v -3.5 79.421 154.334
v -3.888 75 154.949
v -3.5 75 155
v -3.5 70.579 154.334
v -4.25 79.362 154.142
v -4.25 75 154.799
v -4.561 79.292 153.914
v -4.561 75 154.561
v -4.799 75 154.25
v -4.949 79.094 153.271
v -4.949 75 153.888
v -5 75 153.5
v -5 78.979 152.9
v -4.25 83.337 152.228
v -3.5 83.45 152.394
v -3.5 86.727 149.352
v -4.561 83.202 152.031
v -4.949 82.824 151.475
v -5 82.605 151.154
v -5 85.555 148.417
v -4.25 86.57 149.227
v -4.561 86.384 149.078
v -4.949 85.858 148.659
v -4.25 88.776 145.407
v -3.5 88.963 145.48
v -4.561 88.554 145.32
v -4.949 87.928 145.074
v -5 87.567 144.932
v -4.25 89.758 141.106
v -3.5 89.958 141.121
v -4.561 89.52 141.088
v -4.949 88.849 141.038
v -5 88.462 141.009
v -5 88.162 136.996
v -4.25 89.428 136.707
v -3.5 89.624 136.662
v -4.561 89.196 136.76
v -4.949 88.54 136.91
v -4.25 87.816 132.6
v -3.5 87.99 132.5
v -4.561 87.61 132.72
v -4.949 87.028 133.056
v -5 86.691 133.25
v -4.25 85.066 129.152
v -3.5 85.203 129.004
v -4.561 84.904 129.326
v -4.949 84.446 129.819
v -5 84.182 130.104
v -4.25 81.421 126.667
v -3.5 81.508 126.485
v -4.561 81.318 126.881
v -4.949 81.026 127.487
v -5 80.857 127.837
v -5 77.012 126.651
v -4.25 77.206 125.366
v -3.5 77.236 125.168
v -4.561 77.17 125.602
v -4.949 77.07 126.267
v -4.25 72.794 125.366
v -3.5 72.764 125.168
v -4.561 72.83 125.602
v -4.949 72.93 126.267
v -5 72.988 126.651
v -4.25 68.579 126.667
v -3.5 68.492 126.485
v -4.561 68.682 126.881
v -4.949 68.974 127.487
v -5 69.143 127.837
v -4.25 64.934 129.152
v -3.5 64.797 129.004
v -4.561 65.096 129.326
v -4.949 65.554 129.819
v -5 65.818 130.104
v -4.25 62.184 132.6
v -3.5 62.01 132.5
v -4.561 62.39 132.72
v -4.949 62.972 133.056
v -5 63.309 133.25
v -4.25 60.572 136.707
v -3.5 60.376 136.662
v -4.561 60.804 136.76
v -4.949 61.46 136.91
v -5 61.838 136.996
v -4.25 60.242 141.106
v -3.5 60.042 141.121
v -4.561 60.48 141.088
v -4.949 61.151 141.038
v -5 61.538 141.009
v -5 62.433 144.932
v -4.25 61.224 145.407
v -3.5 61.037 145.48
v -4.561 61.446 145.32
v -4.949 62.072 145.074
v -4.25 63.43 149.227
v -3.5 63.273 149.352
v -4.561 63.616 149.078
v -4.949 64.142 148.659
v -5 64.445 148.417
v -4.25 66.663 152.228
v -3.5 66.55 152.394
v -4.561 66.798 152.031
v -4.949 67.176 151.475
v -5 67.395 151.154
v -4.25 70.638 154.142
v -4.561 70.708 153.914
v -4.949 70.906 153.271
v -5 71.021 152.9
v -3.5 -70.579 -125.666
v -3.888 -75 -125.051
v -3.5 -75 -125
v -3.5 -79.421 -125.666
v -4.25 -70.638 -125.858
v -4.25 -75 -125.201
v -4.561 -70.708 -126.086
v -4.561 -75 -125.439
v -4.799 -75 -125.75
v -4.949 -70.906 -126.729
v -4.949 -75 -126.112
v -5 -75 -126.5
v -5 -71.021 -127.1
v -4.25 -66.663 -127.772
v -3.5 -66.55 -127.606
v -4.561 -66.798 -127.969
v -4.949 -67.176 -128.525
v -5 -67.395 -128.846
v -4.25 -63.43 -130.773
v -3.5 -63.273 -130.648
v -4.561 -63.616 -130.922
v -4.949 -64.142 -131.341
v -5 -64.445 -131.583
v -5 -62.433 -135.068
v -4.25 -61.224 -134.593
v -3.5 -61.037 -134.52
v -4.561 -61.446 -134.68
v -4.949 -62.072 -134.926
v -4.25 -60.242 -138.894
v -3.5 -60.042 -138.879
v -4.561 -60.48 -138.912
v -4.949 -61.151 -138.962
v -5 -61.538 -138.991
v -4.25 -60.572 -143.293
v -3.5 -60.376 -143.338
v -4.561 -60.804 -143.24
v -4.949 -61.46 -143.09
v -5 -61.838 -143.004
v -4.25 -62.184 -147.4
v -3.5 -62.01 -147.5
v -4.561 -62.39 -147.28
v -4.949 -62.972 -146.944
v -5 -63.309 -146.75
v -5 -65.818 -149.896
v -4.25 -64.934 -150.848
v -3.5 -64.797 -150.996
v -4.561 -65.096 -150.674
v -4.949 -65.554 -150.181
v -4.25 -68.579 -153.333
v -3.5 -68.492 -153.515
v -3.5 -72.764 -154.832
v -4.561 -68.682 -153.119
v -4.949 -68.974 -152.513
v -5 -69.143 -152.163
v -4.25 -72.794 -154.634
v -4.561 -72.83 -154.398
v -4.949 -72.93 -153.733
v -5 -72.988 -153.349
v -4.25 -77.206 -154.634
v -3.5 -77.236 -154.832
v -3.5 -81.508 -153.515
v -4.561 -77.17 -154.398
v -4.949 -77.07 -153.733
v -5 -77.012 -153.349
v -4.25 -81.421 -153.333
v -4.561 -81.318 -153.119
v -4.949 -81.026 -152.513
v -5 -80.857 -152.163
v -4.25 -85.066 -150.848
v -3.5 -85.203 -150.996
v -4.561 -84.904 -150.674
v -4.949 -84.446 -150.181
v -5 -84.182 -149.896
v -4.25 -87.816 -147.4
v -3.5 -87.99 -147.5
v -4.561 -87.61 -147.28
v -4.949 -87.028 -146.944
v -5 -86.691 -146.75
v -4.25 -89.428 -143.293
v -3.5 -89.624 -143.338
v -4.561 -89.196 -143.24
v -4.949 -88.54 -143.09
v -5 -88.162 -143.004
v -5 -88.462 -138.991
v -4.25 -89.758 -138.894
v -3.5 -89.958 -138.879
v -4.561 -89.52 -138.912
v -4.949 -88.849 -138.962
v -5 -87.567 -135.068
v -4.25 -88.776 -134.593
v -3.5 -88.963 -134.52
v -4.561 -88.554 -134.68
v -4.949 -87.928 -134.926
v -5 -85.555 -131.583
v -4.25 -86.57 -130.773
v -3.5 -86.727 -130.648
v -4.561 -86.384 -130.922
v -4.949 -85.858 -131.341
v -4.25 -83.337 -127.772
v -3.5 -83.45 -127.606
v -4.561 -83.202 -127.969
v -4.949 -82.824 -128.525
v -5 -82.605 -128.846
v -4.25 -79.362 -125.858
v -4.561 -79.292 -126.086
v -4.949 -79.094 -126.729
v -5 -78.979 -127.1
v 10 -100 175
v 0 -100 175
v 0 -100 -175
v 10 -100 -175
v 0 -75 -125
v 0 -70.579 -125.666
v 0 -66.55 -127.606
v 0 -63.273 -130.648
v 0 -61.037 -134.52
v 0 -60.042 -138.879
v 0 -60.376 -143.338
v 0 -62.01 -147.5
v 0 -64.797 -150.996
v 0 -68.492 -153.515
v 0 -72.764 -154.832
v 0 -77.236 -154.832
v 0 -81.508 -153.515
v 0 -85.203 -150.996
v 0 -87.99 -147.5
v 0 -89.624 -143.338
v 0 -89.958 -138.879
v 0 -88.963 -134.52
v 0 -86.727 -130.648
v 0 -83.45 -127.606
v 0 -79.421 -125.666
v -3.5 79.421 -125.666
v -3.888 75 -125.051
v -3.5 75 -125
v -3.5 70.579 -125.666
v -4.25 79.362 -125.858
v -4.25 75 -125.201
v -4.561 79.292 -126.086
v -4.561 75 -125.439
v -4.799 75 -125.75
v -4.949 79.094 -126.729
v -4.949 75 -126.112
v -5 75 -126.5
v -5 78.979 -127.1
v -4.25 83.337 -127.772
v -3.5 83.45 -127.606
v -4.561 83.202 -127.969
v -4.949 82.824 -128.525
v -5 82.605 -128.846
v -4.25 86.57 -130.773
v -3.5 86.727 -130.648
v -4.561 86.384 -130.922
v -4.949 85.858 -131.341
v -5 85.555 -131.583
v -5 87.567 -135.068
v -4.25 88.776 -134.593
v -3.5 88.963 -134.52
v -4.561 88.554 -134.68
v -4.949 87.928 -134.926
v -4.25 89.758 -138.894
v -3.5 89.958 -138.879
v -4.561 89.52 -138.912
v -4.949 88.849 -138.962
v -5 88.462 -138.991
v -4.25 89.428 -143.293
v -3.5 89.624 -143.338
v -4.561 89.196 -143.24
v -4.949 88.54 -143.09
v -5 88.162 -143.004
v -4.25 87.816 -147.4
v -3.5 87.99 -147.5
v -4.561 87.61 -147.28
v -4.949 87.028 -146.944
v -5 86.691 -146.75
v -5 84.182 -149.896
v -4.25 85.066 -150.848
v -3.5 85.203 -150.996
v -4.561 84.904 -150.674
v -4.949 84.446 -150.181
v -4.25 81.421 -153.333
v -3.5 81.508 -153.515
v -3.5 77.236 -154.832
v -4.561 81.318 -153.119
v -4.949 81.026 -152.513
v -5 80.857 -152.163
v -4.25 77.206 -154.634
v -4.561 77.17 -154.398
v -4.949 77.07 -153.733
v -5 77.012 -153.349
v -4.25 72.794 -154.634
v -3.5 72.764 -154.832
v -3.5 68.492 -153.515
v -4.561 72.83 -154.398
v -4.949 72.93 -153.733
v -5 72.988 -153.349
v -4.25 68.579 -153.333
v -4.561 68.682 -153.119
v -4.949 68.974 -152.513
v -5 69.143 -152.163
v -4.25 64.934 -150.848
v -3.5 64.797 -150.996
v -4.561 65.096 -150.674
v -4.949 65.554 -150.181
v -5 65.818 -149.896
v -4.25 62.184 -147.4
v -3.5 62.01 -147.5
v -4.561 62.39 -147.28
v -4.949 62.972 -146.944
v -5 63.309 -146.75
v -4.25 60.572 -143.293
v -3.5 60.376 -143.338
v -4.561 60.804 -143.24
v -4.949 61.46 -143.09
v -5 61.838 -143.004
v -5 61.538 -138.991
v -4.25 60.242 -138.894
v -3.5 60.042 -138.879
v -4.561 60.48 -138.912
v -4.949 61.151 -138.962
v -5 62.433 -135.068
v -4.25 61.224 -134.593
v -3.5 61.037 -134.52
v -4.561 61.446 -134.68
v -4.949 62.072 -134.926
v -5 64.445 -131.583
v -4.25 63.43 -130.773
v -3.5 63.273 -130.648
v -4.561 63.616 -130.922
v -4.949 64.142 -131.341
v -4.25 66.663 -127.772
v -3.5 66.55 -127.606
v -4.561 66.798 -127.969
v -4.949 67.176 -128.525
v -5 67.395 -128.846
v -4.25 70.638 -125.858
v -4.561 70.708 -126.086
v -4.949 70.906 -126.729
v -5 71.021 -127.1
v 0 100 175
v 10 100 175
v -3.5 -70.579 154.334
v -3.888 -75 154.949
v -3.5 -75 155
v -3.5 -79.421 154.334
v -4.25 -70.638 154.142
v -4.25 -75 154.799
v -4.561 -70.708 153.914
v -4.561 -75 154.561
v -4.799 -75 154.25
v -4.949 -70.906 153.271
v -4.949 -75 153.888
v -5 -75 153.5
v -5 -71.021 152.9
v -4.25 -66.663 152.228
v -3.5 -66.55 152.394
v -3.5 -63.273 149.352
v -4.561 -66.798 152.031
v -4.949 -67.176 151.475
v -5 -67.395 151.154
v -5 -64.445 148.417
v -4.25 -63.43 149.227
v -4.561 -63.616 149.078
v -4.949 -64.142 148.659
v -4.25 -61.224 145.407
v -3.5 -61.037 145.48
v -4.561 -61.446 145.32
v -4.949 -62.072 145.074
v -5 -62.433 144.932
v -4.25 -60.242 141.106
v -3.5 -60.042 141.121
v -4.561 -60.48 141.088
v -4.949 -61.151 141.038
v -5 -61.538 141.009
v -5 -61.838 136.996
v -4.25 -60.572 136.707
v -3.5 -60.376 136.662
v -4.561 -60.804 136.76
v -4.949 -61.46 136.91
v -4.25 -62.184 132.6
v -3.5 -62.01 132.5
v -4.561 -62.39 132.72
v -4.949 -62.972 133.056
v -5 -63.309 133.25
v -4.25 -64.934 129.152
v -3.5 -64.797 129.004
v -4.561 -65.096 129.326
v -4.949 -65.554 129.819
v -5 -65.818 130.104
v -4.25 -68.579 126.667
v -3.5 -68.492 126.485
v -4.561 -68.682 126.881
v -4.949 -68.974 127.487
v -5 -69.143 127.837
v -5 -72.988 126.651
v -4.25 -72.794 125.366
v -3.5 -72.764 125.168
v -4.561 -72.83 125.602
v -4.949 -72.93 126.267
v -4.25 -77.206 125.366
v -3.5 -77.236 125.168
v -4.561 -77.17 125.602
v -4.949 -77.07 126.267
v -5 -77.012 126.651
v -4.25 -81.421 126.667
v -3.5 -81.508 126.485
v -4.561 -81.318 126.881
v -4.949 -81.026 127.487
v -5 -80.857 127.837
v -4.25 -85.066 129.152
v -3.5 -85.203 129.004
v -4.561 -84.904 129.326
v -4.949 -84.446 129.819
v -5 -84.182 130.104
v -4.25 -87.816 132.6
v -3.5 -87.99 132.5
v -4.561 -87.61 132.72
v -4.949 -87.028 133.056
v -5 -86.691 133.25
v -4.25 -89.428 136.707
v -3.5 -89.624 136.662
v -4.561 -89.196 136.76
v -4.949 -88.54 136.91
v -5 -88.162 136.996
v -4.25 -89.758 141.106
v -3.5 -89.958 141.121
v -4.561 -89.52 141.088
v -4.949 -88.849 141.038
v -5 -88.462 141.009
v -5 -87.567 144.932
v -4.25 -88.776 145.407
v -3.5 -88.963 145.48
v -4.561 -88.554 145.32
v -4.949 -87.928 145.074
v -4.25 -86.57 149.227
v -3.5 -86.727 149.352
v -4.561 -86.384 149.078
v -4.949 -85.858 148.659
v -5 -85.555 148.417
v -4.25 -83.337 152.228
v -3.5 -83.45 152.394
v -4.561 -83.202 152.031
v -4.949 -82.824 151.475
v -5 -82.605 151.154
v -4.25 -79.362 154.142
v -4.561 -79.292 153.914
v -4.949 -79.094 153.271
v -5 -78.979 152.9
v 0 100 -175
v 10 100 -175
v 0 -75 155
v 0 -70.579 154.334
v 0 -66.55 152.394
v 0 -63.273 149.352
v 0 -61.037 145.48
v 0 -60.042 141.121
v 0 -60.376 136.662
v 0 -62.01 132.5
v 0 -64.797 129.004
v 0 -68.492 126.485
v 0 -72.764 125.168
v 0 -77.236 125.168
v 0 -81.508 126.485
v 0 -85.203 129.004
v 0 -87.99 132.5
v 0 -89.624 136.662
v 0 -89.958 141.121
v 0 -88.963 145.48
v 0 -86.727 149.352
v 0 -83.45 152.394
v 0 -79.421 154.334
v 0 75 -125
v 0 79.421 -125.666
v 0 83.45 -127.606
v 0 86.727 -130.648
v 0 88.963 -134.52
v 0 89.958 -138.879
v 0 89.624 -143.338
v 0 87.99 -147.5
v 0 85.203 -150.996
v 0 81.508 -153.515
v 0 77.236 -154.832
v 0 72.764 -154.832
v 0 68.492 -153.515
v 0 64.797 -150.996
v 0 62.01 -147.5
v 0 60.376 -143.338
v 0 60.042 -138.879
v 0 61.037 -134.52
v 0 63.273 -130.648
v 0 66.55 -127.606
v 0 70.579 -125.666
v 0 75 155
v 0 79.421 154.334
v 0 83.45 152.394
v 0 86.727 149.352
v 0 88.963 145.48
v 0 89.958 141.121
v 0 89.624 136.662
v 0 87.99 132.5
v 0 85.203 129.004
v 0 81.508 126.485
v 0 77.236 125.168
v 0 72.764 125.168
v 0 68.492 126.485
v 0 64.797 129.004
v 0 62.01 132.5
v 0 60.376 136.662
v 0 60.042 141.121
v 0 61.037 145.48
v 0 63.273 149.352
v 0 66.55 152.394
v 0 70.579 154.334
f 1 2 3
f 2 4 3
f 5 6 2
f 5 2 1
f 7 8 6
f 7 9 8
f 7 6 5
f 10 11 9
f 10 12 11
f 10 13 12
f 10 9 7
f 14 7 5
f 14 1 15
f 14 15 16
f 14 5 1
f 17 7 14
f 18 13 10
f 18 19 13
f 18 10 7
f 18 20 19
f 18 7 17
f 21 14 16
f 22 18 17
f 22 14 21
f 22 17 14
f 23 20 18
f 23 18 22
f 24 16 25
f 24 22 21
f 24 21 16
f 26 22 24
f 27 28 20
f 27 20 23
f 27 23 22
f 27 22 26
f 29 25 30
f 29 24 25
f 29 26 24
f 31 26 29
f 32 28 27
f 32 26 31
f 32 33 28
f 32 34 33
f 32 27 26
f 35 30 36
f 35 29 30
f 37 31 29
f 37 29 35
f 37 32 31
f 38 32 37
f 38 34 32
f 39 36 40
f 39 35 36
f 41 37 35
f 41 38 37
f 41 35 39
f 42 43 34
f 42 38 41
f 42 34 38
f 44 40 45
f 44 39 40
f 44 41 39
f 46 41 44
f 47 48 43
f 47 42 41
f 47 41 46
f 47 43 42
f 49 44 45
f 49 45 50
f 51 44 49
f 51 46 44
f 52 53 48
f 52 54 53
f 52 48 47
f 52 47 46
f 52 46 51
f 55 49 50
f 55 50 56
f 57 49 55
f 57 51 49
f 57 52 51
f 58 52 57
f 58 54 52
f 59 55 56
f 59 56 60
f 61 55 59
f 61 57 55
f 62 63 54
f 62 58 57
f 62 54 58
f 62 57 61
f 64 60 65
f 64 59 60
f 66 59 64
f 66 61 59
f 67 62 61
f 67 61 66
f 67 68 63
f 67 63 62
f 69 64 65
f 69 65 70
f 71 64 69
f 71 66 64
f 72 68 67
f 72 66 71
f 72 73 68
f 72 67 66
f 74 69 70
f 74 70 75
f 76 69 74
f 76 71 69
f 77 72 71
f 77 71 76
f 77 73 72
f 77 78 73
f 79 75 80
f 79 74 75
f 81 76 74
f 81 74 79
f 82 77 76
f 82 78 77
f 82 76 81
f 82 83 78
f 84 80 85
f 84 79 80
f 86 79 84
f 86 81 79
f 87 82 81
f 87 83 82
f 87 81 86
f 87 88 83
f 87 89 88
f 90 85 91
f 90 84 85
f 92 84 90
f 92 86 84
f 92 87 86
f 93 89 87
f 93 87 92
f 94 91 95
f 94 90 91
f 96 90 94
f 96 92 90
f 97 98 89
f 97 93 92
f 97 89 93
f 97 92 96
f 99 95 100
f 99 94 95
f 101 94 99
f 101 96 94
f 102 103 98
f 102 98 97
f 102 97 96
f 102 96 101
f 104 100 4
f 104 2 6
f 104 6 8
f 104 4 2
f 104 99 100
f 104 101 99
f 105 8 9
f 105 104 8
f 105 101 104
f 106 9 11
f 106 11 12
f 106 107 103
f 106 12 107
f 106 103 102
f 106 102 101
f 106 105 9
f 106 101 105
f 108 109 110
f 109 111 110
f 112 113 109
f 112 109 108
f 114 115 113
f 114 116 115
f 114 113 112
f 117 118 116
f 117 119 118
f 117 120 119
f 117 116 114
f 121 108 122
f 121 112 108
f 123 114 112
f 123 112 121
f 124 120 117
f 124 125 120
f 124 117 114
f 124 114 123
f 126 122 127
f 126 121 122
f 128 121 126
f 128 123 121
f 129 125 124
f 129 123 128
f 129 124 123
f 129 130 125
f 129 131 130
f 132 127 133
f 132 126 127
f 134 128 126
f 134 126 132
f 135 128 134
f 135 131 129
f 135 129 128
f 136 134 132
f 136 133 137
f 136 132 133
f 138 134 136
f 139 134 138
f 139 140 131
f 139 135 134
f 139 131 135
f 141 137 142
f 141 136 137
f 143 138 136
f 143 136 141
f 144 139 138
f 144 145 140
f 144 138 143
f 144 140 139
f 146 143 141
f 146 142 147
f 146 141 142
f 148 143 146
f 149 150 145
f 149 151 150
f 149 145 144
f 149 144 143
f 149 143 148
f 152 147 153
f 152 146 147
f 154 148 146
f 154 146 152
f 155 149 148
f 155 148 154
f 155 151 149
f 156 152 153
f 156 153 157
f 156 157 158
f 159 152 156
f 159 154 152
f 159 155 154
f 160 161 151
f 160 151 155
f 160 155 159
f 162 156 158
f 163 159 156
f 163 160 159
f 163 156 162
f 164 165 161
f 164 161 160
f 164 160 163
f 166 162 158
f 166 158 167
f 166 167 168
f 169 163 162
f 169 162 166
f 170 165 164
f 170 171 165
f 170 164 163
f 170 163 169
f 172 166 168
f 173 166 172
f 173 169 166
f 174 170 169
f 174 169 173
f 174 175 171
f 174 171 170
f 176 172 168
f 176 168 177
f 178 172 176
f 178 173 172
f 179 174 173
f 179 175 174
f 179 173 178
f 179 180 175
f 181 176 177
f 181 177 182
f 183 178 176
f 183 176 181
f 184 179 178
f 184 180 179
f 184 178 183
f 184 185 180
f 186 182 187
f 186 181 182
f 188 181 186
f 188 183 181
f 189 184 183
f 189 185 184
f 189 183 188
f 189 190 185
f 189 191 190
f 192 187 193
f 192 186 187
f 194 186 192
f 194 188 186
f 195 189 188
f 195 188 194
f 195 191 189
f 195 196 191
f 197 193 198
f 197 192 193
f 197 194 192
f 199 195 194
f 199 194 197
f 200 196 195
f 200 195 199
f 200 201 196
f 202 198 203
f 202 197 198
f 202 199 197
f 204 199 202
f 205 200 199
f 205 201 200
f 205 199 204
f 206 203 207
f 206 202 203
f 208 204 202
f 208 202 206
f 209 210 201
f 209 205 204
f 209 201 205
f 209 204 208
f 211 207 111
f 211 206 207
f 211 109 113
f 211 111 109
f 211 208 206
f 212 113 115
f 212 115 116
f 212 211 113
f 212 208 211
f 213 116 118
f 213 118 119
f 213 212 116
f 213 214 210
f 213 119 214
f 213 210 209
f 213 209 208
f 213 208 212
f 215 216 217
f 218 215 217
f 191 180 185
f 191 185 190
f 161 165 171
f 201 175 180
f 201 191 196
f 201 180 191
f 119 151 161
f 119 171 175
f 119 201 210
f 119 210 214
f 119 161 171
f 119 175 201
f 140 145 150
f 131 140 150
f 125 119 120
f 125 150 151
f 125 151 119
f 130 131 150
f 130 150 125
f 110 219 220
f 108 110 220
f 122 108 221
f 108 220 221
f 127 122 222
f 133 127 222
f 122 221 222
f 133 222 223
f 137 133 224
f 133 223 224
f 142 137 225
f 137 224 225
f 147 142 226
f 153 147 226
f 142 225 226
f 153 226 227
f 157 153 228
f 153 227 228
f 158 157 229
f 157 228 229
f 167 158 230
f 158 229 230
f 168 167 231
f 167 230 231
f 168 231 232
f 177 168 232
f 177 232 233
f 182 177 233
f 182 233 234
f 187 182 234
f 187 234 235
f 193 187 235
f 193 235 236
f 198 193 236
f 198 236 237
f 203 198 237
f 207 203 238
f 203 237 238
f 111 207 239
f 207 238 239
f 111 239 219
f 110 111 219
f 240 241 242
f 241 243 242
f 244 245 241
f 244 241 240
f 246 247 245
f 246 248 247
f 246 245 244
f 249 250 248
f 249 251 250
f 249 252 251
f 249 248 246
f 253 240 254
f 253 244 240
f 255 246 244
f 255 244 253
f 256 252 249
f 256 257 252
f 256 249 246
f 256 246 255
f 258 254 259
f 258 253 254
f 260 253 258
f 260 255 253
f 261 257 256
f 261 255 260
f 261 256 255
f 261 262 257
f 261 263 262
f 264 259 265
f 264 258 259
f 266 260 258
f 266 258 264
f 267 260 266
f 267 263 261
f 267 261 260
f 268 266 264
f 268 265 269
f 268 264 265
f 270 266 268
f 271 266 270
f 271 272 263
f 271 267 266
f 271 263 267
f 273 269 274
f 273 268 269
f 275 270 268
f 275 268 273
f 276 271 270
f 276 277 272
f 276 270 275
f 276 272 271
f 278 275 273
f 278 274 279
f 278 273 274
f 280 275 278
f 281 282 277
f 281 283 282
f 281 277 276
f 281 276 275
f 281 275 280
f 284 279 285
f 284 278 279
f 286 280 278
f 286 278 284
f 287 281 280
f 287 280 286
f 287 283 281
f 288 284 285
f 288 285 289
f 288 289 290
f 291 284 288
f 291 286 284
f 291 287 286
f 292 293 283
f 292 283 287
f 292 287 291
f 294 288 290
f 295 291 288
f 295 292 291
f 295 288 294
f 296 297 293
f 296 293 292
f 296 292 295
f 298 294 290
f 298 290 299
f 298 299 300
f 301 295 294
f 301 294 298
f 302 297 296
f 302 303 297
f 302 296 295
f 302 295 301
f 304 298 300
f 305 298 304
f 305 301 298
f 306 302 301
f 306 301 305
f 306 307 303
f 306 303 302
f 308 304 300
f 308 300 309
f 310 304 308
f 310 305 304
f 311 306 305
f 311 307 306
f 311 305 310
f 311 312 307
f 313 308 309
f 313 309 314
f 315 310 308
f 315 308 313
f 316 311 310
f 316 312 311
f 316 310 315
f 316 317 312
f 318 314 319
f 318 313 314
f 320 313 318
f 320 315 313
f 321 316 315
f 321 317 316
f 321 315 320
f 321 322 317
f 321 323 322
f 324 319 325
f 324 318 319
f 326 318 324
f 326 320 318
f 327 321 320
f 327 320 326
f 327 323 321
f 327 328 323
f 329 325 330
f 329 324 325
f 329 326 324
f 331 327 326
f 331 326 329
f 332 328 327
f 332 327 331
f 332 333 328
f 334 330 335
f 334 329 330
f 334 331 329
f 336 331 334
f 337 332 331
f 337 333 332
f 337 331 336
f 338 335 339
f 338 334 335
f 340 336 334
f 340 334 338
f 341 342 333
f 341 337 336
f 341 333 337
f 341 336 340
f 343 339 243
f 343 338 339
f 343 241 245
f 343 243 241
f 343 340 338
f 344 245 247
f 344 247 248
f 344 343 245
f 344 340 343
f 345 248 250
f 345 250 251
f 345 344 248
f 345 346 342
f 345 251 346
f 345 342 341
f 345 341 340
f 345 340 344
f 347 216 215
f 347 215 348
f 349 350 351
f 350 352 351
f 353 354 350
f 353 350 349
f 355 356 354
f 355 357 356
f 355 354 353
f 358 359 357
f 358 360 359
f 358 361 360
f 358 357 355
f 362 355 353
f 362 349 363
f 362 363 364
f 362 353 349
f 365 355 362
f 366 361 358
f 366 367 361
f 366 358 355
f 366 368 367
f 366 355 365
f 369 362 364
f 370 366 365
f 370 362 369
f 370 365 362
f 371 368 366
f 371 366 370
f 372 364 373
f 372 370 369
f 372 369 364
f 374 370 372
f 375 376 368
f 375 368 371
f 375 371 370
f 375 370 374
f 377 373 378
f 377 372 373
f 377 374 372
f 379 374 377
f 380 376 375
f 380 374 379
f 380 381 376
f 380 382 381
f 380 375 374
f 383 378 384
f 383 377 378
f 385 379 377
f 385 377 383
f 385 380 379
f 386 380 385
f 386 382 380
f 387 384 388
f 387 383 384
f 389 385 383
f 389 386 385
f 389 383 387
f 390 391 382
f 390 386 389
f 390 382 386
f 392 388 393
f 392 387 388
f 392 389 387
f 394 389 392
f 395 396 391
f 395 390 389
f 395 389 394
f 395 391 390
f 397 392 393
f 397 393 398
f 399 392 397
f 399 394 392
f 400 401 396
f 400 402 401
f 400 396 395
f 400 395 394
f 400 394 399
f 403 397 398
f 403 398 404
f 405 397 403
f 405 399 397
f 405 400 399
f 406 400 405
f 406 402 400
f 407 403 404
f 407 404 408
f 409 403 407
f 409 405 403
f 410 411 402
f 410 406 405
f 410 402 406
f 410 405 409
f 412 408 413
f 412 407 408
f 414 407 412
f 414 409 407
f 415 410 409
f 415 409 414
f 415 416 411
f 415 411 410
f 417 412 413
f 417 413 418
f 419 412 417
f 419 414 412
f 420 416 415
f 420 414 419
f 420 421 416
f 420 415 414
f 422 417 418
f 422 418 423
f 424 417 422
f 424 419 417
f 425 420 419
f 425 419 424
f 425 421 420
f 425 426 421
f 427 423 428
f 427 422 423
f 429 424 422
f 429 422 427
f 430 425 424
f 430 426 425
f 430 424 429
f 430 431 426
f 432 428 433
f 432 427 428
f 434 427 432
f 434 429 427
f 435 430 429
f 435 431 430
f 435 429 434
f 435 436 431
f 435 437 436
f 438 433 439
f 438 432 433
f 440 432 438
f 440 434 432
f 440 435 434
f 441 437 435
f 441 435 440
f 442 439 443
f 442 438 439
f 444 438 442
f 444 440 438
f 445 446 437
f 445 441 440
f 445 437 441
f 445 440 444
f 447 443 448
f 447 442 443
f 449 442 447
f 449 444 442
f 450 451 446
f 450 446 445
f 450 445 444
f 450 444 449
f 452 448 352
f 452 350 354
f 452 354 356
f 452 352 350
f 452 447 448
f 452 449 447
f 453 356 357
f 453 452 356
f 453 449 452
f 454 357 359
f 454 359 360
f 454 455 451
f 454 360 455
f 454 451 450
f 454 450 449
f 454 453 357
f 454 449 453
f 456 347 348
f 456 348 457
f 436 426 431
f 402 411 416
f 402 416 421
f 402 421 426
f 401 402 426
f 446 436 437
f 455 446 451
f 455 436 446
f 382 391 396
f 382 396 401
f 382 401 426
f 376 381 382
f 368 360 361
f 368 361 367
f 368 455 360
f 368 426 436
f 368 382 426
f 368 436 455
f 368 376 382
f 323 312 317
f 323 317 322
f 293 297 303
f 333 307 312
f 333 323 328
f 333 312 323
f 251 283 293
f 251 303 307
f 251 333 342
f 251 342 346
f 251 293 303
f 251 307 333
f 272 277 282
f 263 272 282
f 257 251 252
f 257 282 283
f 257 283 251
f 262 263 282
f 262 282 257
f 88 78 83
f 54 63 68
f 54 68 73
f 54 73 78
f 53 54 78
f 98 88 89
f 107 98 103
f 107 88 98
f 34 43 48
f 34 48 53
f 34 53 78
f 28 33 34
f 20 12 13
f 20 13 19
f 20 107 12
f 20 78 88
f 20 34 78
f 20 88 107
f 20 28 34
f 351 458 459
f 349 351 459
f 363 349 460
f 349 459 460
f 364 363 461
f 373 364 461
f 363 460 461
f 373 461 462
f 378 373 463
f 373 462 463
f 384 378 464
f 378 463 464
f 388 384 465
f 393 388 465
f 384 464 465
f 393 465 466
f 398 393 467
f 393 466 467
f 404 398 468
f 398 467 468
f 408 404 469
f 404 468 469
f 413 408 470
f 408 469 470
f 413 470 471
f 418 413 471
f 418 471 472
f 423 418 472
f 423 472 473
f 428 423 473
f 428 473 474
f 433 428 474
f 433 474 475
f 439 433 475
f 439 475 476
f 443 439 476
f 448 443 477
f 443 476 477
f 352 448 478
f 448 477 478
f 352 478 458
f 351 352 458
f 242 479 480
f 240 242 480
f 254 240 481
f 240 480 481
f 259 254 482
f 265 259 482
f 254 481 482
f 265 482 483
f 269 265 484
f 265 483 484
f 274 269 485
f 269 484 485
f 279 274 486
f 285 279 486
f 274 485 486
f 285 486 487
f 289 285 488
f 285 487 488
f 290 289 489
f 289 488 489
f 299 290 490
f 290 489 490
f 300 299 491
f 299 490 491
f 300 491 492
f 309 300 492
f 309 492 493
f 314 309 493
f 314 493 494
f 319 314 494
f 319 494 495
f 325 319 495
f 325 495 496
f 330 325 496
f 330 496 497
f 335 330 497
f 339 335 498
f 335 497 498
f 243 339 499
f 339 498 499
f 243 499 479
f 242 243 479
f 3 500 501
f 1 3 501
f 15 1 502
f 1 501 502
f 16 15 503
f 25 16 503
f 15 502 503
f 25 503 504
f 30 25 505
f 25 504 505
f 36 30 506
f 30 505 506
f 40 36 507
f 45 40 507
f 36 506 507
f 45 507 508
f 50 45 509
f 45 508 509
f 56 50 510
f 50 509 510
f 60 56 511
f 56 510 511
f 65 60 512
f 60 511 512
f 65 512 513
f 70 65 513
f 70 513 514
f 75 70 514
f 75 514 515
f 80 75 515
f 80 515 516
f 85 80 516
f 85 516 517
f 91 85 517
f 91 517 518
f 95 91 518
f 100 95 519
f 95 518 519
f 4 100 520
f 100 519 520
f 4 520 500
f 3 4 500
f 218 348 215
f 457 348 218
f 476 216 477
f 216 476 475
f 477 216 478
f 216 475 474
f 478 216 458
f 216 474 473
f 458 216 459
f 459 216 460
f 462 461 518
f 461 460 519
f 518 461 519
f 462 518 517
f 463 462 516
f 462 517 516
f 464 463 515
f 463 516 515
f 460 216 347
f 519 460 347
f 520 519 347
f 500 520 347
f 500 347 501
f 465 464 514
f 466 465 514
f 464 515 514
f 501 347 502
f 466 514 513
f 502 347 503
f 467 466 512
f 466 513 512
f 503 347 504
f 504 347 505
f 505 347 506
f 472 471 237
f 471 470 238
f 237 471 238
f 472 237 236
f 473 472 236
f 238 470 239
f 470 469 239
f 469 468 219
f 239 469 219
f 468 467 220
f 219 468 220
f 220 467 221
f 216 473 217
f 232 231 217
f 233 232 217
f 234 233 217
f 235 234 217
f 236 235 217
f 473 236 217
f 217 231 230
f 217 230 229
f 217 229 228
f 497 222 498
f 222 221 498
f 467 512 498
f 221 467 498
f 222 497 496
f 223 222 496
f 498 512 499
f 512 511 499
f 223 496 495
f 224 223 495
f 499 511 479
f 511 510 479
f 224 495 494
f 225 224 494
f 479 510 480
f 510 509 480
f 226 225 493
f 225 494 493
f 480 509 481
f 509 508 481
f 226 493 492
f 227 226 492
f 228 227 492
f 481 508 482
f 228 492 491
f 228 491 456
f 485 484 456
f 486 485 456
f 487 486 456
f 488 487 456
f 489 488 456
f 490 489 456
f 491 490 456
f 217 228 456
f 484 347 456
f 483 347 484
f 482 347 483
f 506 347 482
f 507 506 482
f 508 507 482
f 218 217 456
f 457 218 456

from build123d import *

# Parameters (mm, degrees)
SKICA1_W               = 350
SKICA1_H               = 200
VYSUNOUT1_DEPTH        = 10
SKICA2_R               = 15
VYSUNOUT2_DEPTH        = 5
ZAOBLIT1_R             = 1.5
LINPOLE1_COUNT         = 2
LINPOLE1_PITCH         = 280
LINPOLE1_COUNT_DIR2    = 2
LINPOLE1_PITCH_DIR2    = 150
ZAOBLIT1_OF_LINPOLE1_R = 1.5


with BuildPart() as part:
    # Skica1 → Vysunout1 (new body)
    with BuildSketch(Plane(origin=(0, 0, 0), x_dir=(0, 0, -1), z_dir=(1, 0, 0))):
        Rectangle(SKICA1_W, SKICA1_H)
    extrude(amount=VYSUNOUT1_DEPTH)

    # Skica2 → Vysunout2 (add)
    with BuildSketch(Plane.ZY):
        with Locations((-140, 75)):
            Circle(SKICA2_R)
    vysunout2 = extrude(amount=VYSUNOUT2_DEPTH)

    # Zaoblit1
    zaoblit1_edges = [part.edges().sort_by_distance(p)[0] for p in [
        (-5, 75, -155),
    ]]
    fillet(zaoblit1_edges, radius=ZAOBLIT1_R)

    # LinPole1: Vysunout2 2 × 2
    with Locations(*[(0, -j * LINPOLE1_PITCH_DIR2, i * LINPOLE1_PITCH) for i in range(LINPOLE1_COUNT) for j in range(LINPOLE1_COUNT_DIR2) if (i, j) != (0, 0)]):
        add(vysunout2)

    # Zaoblit1 of LinPole1
    zaoblit1_of_linpole1_edges = [part.edges().sort_by_distance(p)[0] for p in [
        (-5, -75, -155),
        (-5, 75, 125),
        (-5, -75, 125),
    ]]
    fillet(zaoblit1_of_linpole1_edges, radius=ZAOBLIT1_OF_LINPOLE1_R)


solid = part.part
